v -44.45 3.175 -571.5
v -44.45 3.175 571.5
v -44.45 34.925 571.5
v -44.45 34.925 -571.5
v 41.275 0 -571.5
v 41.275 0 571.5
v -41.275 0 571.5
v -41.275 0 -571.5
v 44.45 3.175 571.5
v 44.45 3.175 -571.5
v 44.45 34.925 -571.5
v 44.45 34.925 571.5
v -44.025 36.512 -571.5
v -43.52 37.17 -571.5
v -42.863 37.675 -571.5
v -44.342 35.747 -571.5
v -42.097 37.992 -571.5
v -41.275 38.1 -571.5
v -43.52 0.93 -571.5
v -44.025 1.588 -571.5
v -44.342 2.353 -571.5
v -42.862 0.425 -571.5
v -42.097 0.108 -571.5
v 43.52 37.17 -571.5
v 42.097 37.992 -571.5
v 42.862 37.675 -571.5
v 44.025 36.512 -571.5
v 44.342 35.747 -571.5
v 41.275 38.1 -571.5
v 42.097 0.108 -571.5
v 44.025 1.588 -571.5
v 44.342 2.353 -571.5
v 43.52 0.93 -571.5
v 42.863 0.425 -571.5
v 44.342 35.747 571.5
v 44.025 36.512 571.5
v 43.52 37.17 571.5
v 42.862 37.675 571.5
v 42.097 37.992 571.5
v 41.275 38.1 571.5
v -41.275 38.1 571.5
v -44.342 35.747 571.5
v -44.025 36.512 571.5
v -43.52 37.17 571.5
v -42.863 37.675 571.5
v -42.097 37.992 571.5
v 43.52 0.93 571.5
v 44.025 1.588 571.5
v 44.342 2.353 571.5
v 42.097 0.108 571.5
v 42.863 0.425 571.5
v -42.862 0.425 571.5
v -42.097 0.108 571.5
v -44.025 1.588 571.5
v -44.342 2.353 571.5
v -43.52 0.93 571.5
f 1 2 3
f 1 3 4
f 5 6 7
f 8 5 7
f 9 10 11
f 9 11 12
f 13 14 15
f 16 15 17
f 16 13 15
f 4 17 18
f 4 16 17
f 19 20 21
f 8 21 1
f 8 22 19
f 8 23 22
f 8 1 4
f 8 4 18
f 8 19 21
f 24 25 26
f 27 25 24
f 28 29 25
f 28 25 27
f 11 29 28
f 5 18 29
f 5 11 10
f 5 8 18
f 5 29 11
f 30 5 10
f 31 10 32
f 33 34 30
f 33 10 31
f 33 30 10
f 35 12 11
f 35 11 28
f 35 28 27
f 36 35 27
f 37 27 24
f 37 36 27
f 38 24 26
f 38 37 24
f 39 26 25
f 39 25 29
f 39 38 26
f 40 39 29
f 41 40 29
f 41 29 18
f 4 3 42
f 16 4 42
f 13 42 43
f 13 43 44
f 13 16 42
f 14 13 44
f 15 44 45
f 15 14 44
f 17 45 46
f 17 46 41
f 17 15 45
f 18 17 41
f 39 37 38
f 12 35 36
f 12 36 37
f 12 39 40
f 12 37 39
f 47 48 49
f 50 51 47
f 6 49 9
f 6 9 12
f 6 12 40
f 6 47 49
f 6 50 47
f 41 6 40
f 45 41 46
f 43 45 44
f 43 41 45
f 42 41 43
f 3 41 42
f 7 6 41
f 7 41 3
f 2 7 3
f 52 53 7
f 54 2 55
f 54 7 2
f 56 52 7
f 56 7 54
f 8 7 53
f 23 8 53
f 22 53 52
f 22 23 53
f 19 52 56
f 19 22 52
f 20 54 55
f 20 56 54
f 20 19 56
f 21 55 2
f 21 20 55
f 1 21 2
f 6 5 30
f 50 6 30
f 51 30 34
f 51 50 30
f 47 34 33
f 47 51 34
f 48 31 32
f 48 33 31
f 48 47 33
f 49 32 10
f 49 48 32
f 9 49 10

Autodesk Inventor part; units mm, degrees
ref_plane "YZ Plane" through (0, 0, 0) normal (1, 0, 0) x (0, 1, 0)
ref_plane "XZ Plane" through (0, 0, 0) normal (0, 1, 0) x (-1, 0, 0)
ref_plane "XY Plane" through (0, 0, 0) normal (0, 0, 1) x (1, 0, 0)
sketch "Sketch1" plane through (0, 0, 0) normal (0, 1, 0) x (-1, 0, 0)
  line L0 (44.45, -571.5) -> (-44.45, -571.5)
  line L1 (-44.45, -571.5) -> (-44.45, 571.5)
  line L2 (-44.45, 571.5) -> (44.45, 571.5)
  line L3 (44.45, 571.5) -> (44.45, -571.5)
  line L4 (44.45, -571.5) -> (-44.45, 571.5) construction
  line L5 (-44.45, -571.5) -> (44.45, 571.5) construction
  point P0 (0, 0)
  dimension "d0" = 88.9
  dimension "d1" = 1143
extrude "Extrusion1" add sketch "Sketch1" along normal blind 38.1
fillet "Fillet1" radius 3.175 4 edges at (44.45, 38.1, 0) (44.45, 0, 0) (-44.45, 38.1, 0) (-44.45, 0, 0)
properties part number "2x4" material "Pine"
